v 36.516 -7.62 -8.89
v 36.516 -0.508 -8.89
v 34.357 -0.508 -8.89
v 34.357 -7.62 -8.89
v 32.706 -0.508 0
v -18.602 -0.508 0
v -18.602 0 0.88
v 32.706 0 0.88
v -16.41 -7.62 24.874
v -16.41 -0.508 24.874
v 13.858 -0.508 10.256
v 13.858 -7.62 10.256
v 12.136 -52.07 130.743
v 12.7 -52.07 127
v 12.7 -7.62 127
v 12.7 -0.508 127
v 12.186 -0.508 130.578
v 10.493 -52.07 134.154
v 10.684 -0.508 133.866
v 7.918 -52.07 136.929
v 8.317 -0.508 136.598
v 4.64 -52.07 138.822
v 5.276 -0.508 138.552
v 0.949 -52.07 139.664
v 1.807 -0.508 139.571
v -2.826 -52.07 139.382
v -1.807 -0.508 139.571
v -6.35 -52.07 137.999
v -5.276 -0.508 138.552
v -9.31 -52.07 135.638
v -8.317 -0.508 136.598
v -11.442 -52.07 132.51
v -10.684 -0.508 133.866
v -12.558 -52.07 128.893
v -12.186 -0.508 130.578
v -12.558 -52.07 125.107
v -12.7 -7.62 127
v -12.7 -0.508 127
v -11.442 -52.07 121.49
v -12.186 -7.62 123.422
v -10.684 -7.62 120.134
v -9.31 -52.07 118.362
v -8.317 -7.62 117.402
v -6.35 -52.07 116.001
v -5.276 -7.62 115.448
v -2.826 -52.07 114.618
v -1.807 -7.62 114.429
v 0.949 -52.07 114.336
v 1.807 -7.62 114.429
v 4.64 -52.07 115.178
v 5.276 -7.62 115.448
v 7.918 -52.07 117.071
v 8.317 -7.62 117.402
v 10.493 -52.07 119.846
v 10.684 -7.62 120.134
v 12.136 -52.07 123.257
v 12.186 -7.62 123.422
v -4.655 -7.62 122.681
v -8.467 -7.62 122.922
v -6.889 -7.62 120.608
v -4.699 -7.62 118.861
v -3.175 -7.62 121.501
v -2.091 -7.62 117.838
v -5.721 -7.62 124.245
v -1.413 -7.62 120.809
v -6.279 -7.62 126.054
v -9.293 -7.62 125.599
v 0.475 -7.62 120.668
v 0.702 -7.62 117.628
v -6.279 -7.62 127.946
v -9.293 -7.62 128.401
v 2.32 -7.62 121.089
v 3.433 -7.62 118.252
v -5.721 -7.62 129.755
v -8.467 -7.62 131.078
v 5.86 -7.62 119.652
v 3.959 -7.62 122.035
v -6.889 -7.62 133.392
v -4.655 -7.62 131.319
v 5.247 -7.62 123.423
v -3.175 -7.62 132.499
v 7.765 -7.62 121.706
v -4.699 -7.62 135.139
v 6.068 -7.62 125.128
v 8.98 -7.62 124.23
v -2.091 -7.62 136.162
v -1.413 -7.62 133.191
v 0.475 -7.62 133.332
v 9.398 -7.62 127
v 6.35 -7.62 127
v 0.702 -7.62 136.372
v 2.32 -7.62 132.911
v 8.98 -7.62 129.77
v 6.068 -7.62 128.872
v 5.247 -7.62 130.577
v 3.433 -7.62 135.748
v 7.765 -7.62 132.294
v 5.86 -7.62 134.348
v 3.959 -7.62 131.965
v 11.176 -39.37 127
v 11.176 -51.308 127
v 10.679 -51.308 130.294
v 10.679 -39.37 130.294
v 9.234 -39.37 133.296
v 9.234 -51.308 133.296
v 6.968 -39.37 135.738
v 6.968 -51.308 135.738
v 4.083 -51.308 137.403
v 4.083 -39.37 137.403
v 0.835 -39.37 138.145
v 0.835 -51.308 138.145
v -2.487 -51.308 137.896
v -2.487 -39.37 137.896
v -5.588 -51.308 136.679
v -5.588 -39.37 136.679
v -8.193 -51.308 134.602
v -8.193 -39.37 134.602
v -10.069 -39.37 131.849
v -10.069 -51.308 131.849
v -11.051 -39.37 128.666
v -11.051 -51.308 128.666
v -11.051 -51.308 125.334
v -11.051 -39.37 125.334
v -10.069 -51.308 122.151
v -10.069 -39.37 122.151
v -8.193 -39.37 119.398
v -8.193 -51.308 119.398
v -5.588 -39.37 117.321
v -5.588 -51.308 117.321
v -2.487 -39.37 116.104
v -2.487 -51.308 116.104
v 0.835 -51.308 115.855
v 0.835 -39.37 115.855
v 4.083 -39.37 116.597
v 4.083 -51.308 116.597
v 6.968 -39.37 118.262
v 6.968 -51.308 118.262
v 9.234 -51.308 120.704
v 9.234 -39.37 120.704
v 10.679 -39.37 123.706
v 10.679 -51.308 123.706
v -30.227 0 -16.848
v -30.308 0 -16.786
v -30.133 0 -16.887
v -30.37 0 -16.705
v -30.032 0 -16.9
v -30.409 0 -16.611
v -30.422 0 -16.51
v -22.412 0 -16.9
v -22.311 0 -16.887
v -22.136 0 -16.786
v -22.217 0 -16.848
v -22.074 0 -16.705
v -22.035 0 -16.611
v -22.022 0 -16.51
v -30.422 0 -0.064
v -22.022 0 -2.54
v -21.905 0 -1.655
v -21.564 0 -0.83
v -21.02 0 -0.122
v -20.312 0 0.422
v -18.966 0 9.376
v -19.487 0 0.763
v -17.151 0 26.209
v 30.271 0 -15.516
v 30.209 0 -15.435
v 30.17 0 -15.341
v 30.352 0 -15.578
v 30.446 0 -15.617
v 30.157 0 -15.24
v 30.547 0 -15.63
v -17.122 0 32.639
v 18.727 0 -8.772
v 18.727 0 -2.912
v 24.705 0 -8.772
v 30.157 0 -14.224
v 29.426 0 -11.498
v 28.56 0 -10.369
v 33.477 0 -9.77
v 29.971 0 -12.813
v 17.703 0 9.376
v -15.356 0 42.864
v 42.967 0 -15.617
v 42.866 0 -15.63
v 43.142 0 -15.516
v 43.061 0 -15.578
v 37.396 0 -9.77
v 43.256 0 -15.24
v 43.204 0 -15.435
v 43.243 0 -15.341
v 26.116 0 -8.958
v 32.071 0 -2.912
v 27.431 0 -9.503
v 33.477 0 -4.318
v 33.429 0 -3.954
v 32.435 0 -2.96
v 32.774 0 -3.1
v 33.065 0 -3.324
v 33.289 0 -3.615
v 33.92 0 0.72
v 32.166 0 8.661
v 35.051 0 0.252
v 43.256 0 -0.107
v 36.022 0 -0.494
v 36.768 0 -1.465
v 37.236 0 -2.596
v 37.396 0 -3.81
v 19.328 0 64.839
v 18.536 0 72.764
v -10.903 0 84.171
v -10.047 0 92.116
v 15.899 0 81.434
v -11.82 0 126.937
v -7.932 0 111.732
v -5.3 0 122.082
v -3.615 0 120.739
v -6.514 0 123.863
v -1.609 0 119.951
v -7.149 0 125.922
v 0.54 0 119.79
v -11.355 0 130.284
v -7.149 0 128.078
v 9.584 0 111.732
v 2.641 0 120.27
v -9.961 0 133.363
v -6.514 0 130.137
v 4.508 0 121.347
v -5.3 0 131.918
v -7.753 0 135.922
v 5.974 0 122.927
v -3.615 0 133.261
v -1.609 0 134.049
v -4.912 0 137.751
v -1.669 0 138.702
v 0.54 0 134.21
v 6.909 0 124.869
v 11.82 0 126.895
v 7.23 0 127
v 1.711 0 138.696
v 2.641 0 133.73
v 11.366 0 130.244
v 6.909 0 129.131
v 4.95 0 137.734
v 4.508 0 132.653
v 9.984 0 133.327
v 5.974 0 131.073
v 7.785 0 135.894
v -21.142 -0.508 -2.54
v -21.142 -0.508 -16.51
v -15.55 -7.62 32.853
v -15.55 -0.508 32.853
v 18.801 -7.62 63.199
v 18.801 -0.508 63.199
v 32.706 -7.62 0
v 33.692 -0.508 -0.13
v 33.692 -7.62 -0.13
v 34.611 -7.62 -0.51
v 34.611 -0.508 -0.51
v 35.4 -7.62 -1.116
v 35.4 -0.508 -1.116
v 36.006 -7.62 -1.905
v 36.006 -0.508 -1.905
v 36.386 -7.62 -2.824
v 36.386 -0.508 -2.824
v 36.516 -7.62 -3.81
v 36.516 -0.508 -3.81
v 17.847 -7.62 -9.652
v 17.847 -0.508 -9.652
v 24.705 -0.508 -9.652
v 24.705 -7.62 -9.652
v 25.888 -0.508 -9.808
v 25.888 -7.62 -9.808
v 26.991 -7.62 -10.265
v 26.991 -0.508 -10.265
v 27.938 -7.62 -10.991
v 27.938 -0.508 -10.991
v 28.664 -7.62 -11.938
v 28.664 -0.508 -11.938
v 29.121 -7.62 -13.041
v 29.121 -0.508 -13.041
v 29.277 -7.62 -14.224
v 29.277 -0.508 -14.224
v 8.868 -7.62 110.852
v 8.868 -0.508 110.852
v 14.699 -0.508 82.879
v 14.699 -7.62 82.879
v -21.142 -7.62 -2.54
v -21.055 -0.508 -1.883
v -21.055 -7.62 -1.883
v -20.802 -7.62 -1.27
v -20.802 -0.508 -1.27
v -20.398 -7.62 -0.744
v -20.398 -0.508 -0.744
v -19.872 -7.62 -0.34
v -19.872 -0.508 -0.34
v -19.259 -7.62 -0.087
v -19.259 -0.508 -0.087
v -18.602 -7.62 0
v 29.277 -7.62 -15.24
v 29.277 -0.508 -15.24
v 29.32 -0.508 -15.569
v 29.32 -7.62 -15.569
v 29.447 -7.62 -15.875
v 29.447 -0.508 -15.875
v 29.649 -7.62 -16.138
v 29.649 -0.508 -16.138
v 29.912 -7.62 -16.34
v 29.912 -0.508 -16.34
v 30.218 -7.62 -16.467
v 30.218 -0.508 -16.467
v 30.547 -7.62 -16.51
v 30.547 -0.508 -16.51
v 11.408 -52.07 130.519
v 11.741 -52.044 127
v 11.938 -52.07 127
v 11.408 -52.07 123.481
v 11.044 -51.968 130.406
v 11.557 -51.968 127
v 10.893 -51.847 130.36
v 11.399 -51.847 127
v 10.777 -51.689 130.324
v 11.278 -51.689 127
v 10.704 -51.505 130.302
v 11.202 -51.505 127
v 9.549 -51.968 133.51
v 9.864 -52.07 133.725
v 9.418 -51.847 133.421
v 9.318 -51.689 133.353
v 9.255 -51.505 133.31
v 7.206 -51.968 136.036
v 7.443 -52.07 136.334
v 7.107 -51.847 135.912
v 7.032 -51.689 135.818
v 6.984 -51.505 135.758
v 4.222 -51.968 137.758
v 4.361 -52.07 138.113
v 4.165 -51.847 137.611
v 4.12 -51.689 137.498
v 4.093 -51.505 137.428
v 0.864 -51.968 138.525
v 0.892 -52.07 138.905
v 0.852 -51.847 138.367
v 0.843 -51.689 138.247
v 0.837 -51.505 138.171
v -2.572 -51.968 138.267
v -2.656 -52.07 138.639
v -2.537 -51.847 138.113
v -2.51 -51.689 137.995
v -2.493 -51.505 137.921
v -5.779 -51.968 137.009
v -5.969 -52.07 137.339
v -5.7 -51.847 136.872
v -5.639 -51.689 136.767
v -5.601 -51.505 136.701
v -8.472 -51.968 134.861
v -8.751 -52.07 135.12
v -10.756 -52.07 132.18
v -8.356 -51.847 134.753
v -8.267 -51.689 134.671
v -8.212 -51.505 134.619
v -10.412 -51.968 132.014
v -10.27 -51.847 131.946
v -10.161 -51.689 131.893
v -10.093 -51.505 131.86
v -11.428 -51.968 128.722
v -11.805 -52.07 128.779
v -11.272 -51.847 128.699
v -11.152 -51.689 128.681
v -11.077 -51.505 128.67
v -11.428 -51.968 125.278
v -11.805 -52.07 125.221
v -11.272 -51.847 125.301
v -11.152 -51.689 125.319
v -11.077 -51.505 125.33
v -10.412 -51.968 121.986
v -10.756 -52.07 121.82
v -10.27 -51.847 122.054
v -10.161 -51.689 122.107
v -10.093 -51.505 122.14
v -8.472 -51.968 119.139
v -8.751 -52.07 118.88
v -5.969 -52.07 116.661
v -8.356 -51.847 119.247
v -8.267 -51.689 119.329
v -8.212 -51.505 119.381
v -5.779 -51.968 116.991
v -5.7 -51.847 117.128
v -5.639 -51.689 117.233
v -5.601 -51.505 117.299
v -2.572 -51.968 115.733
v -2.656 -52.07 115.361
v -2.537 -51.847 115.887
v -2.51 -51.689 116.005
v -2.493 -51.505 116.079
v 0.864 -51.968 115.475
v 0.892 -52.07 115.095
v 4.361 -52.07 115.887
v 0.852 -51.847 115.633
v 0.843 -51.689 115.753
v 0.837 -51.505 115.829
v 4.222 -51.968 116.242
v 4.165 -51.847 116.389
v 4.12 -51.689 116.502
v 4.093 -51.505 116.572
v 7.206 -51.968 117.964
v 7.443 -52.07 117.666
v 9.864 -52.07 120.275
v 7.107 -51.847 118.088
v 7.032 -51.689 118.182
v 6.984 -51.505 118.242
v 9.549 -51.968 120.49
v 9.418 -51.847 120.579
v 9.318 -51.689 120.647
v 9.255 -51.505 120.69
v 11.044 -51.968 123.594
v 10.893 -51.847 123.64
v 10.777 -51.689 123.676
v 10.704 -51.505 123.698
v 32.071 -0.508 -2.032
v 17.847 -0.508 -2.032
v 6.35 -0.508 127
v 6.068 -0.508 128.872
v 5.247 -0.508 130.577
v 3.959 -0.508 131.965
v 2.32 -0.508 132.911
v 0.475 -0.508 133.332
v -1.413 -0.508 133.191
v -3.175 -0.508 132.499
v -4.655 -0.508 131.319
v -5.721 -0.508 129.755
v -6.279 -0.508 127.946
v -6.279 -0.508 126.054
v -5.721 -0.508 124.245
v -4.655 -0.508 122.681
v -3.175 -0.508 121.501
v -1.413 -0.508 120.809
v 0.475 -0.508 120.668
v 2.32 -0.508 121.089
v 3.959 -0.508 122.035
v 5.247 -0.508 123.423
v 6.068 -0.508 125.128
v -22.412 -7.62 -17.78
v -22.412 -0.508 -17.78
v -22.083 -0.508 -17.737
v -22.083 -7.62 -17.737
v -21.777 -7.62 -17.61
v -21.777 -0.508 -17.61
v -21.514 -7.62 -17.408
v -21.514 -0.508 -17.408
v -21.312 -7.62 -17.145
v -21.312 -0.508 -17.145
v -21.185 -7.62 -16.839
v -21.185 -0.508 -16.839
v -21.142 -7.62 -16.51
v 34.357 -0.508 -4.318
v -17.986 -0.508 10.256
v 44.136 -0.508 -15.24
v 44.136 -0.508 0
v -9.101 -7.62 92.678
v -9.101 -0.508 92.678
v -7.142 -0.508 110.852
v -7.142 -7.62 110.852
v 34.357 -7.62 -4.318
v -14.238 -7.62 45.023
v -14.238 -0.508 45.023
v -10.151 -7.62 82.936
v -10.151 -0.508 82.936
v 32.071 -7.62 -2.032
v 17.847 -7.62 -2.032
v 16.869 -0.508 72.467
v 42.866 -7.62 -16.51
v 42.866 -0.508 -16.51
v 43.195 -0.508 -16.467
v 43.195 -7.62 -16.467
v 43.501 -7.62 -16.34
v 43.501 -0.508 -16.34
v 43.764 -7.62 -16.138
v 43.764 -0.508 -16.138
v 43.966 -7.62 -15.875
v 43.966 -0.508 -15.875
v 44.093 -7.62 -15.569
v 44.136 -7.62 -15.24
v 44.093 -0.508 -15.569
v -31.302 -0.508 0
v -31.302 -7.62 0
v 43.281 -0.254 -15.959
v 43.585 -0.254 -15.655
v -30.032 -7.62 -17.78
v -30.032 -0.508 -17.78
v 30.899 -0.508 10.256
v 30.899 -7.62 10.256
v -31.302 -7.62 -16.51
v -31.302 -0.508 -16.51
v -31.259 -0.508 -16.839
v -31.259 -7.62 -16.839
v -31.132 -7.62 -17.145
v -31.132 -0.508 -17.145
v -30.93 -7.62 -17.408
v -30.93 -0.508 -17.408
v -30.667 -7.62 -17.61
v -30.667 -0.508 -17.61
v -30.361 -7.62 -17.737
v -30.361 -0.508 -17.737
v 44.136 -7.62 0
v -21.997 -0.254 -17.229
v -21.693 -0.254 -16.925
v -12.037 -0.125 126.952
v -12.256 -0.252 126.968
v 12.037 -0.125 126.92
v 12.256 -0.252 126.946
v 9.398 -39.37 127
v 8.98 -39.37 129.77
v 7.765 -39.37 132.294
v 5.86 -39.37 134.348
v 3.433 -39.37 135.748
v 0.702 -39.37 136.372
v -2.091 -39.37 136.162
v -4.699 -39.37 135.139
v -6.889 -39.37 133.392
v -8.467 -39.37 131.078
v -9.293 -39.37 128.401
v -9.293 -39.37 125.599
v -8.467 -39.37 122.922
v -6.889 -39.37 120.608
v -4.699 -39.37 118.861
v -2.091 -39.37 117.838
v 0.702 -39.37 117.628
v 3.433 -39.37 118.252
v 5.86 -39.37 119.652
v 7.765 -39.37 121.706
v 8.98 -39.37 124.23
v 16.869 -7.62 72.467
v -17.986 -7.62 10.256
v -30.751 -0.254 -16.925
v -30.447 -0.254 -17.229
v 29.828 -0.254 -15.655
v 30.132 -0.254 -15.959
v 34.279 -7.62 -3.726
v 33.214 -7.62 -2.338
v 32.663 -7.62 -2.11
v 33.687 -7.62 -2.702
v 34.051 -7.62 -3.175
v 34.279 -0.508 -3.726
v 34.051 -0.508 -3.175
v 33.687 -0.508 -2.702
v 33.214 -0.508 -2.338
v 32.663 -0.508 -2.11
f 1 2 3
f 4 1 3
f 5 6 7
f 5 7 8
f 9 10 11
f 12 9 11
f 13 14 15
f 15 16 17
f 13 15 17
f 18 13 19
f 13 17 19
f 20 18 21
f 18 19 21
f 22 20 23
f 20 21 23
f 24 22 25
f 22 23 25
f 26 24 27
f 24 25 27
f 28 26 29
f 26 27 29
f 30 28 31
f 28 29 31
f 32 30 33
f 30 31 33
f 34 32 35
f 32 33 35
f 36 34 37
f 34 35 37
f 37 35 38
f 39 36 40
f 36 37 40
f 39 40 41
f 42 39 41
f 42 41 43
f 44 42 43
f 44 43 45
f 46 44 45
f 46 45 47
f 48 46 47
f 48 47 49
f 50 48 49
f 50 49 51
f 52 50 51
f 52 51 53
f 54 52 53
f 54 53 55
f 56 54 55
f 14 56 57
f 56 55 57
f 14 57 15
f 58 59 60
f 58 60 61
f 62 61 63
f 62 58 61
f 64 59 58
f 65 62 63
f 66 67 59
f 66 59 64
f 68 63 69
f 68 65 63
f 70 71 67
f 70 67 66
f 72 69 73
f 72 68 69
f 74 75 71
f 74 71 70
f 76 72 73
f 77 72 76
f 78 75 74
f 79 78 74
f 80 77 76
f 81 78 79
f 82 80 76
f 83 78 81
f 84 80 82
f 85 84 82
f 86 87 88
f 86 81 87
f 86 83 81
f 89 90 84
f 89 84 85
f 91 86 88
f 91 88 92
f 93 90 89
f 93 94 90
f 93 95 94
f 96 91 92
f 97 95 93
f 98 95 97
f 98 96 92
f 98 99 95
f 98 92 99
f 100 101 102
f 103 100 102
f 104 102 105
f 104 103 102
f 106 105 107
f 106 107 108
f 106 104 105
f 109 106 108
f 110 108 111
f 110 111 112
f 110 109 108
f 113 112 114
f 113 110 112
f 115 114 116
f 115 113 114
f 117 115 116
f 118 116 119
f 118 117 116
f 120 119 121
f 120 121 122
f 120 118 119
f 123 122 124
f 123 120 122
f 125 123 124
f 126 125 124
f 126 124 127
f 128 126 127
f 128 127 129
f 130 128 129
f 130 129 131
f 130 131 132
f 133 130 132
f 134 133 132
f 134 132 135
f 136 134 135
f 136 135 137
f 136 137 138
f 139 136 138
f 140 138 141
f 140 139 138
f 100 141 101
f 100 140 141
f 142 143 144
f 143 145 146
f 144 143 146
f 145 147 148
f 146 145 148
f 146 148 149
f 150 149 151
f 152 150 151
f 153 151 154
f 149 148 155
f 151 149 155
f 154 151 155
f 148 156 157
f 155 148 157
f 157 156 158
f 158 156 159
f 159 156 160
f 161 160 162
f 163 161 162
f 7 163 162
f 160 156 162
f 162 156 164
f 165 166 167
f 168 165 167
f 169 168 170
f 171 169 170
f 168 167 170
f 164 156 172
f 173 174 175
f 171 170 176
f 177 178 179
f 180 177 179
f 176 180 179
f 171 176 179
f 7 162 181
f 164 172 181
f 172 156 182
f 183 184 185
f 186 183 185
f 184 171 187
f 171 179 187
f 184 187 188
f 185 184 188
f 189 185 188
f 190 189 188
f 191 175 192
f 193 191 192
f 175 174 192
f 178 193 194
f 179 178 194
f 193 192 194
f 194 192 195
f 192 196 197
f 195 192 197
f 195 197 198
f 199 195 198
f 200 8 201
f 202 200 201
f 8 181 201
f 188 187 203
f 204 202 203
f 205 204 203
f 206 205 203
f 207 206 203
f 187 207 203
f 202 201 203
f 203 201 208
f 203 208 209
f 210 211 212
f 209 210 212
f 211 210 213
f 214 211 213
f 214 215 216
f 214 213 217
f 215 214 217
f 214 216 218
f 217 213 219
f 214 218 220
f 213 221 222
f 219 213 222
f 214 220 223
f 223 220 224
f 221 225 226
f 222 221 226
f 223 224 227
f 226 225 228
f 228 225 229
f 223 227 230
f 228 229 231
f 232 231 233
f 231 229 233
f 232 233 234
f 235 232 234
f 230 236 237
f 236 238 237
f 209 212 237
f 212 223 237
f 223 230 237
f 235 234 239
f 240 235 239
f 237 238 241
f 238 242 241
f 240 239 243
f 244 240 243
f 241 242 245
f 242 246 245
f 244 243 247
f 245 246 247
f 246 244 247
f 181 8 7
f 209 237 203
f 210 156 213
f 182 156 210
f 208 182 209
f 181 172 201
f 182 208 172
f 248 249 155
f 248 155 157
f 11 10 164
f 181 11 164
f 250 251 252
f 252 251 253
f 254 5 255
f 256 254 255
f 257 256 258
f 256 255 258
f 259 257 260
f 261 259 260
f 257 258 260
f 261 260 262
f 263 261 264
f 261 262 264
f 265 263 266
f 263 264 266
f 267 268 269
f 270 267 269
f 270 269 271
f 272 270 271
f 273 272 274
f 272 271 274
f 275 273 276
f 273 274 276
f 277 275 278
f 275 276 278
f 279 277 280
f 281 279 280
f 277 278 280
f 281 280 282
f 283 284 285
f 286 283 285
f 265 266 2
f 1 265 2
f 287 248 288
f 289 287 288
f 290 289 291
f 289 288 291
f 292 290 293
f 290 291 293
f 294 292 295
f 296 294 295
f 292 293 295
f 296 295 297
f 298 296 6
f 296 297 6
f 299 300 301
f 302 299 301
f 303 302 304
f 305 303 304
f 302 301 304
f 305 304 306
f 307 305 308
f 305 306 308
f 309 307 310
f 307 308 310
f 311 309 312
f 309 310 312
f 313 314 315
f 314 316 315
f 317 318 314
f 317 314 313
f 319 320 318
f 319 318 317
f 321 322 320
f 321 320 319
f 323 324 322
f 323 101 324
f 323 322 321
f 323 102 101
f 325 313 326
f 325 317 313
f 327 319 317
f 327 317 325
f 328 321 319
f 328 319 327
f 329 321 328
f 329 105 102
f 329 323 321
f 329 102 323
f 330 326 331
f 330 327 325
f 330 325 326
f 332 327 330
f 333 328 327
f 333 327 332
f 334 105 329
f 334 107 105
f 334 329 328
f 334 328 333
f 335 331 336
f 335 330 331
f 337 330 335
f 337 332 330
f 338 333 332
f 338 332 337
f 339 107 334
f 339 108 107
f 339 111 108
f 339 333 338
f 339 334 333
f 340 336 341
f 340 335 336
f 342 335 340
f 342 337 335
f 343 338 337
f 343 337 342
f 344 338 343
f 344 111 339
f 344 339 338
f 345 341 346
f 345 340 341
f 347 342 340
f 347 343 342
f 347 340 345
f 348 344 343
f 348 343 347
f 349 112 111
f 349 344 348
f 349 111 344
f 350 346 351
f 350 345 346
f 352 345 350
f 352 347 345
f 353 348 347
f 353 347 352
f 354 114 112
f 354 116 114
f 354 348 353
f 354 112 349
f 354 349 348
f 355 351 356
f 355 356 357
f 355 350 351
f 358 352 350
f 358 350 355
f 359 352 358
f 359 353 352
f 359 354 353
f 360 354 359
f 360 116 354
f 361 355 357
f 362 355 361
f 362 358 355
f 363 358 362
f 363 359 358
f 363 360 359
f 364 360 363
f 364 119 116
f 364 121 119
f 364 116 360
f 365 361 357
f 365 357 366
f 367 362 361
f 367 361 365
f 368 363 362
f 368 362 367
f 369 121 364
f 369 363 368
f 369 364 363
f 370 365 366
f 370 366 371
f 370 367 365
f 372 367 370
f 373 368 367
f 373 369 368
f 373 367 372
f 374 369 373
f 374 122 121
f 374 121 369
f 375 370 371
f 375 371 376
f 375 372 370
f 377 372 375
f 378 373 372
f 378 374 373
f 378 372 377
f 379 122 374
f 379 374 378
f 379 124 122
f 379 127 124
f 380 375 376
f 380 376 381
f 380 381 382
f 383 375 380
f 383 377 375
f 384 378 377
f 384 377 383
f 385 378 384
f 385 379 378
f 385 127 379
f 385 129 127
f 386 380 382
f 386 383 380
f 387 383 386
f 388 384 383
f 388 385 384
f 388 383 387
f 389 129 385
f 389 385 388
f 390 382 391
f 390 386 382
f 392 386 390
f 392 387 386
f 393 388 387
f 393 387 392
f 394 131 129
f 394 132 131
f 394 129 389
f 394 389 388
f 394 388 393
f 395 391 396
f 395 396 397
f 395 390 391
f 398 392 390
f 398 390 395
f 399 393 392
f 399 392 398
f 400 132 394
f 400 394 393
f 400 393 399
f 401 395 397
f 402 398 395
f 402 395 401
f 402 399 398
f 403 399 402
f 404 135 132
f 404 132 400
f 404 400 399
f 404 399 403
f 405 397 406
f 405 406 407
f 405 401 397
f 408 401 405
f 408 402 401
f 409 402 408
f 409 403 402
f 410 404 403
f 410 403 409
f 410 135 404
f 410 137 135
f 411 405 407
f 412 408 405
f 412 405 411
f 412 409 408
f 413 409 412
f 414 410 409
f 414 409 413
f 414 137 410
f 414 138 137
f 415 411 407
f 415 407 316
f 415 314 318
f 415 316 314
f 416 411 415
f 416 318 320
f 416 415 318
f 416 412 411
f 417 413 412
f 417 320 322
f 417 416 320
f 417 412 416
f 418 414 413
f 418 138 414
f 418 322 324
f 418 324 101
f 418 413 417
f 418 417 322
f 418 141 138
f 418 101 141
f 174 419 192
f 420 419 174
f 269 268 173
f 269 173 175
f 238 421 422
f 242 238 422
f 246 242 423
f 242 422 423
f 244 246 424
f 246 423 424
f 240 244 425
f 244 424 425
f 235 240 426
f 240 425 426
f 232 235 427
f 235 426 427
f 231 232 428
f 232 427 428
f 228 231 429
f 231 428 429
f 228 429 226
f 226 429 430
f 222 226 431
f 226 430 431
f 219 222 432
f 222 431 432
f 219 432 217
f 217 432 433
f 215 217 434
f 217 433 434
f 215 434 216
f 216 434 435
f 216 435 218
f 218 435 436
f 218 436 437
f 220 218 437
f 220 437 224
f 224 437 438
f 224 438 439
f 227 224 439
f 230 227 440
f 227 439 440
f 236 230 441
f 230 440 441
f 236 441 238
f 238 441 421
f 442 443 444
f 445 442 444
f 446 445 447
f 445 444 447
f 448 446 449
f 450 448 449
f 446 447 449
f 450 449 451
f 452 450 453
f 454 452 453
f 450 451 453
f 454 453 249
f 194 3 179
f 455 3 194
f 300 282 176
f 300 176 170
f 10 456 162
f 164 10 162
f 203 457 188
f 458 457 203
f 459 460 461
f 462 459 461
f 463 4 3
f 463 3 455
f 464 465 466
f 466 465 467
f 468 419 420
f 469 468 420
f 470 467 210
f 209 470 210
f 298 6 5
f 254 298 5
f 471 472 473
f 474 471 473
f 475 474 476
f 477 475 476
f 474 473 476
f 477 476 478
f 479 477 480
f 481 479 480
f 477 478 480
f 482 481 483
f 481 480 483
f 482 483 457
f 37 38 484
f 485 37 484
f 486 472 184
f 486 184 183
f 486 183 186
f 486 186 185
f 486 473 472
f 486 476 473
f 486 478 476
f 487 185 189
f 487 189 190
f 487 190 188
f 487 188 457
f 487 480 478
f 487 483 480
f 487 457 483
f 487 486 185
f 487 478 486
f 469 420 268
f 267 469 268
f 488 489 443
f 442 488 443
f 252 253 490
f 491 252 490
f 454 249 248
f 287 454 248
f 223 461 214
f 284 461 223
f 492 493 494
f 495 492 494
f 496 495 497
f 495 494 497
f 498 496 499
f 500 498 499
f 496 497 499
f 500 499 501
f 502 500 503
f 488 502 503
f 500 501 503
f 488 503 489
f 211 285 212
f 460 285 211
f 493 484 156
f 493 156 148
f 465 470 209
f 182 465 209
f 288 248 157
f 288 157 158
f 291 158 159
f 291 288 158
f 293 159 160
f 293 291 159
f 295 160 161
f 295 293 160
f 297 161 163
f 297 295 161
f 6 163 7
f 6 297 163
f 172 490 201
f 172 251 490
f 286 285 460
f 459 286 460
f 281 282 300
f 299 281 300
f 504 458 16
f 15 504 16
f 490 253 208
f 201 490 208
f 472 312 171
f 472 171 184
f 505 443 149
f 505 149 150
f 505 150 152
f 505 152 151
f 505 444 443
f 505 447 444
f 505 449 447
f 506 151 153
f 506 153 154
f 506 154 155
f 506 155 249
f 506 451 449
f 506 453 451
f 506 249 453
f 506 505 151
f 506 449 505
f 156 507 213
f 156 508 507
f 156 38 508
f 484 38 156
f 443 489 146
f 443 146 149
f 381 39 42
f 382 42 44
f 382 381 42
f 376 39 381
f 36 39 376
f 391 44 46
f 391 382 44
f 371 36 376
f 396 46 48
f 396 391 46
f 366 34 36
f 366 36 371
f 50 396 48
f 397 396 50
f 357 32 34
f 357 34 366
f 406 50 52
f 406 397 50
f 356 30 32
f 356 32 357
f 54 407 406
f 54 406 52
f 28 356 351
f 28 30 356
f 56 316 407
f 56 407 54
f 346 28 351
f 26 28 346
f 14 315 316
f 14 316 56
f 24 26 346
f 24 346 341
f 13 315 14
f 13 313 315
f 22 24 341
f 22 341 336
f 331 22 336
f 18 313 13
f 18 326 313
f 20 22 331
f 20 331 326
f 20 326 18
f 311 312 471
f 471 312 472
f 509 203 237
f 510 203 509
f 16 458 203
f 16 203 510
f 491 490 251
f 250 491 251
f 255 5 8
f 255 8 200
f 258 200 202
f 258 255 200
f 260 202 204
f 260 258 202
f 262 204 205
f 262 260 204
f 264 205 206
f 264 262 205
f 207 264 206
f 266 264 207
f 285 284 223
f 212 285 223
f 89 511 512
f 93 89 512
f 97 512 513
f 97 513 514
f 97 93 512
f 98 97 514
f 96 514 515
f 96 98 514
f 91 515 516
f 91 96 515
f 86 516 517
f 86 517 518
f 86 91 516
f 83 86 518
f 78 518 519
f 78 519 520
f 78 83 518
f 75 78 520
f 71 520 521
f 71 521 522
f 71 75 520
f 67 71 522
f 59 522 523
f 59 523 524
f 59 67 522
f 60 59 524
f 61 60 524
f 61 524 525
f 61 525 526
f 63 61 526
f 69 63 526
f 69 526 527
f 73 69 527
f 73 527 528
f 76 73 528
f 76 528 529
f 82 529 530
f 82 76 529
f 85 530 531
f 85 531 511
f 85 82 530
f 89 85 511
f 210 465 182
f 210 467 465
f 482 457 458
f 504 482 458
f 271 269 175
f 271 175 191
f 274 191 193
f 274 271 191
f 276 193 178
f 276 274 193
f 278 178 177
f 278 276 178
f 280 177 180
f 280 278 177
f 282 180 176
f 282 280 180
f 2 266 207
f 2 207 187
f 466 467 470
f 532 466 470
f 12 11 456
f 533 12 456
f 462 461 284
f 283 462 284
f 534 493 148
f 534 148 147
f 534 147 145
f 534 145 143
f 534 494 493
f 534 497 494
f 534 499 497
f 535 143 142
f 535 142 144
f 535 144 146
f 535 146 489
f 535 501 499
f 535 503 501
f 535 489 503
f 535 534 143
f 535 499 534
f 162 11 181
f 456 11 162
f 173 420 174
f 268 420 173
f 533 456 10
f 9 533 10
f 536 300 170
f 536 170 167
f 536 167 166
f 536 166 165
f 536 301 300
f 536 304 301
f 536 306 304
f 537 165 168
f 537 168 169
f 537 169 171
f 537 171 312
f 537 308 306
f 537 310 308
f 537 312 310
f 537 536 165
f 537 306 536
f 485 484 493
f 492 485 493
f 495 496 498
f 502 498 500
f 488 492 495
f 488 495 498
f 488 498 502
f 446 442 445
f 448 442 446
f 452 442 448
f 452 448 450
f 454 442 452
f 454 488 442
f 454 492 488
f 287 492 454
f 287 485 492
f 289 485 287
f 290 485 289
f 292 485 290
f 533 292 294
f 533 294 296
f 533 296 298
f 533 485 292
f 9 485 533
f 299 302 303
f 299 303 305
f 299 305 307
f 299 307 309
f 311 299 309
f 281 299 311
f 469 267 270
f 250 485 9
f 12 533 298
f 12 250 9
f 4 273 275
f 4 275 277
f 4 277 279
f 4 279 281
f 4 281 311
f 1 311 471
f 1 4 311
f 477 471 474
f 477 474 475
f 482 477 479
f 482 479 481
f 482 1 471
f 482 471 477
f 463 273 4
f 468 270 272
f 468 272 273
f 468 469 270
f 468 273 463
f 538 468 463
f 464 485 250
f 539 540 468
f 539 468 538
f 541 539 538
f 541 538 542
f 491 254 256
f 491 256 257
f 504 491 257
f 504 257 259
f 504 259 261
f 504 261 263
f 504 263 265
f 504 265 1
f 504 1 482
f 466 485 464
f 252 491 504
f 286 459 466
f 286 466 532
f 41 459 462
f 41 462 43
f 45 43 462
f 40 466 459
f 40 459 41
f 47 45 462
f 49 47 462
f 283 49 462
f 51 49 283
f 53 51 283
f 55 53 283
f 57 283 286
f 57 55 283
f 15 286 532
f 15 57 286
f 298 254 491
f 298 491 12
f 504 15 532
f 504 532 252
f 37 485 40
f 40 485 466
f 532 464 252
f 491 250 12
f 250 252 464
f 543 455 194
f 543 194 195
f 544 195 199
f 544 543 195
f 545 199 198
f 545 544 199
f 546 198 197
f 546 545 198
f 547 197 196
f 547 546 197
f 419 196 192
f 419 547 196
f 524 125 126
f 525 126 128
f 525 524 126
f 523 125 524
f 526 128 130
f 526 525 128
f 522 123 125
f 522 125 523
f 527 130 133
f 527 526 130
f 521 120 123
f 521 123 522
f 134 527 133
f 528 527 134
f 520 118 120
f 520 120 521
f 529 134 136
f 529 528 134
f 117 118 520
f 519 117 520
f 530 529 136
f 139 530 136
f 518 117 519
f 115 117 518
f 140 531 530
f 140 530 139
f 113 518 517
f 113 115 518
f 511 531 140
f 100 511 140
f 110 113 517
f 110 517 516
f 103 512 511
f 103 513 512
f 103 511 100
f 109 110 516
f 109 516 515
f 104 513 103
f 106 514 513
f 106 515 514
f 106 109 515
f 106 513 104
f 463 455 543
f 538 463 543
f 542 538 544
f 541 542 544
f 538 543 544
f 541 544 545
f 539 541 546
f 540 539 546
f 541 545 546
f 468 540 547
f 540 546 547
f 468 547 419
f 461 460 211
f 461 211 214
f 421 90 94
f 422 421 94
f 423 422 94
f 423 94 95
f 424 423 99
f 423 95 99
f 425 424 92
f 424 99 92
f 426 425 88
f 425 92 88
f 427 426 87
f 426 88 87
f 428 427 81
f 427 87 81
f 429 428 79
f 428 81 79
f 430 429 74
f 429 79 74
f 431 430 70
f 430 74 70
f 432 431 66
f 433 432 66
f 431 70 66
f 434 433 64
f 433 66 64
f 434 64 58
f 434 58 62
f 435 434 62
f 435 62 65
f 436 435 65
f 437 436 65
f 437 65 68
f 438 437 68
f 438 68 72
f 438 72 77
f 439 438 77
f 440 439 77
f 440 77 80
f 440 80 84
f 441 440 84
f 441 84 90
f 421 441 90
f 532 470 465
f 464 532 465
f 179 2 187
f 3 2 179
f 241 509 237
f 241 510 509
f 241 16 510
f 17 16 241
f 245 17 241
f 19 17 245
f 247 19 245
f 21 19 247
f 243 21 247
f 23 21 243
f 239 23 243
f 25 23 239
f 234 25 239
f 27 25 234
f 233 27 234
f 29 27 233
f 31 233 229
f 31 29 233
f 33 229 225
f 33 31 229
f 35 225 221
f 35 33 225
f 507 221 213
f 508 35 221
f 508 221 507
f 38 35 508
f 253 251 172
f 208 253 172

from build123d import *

# Parameters (mm, degrees)
F1_DEPTH = 7.62
F2_R     = 12.7
F2_R_2   = 9.398
F3_DEPTH = 31.75
F4_R     = 12.7
F4_R_2   = 11.176
F5_DEPTH = 12.7
F6_R     = 6.35
F7_DEPTH = 25.4
F8_R     = 0.762
F9_SIZE2 = 0.508
F9_SIZE  = 0.8798818102


with BuildPart() as f1:
    # F0 (on Front) → F1 (new body)
    with BuildSketch(Plane.XZ):
        with BuildLine():
            ThreePointArc((-21.1420084076, -2.54), (-20.3980596318, -0.7439487758), (-18.6020084076, 0))
            Line((-18.6020084076, 0), (32.7059915924, 0))
            ThreePointArc((32.7059915924, 0), (35.4000684287, -1.1159231637), (36.5159915924, -3.81))
            Line((36.5159915924, -3.81), (36.5159915924, -8.89))
            Line((36.5159915924, -8.89), (34.3569915924, -8.89))
            Line((34.3569915924, -8.89), (34.3569915924, -4.318))
            ThreePointArc((34.3569915924, -4.318), (33.6874376942, -2.7015538982), (32.0709915924, -2.032))
            Line((32.0709915924, -2.032), (29.2769915924, -2.032))
            Line((29.2769915924, -2.032), (17.8469915924, -2.032))
            Line((17.8469915924, -2.032), (17.8469915924, -9.652))
            Line((17.8469915924, -9.652), (24.7049915924, -9.652))
            ThreePointArc((24.7049915924, -9.652), (27.937883796, -10.9911077964), (29.2769915924, -14.224))
            Line((29.2769915924, -14.224), (29.2769915924, -15.24))
            ThreePointArc((29.2769915924, -15.24), (29.6489659803, -16.1380256121), (30.5469915924, -16.51))
            Line((30.5469915924, -16.51), (42.8659915924, -16.51))
            ThreePointArc((42.8659915924, -16.51), (43.7640172045, -16.1380256121), (44.1359915924, -15.24))
            Line((44.1359915924, -15.24), (44.1359915924, 0))
            Line((44.1359915924, 0), (12.7, 127))
            ThreePointArc((12.7, 127), (0, 139.7), (-12.7, 127))
            Line((-12.7, 127), (-31.3020084076, 0))
            Line((-31.3020084076, 0), (-31.3020084076, -16.51))
            ThreePointArc((-31.3020084076, -16.51), (-30.9300340197, -17.4080256121), (-30.0320084076, -17.78))
            Line((-30.0320084076, -17.78), (-22.4120084076, -17.78))
            ThreePointArc((-22.4120084076, -17.78), (-21.5139827955, -17.4080256121), (-21.1420084076, -16.51))
            Line((-21.1420084076, -16.51), (-21.1420084076, -2.54))
        make_face()
        Polygon((13.8583155349, 10.2559253573), (-17.4904800951, 10.2559253573), (-17.9861974368, 10.2559253573), (-16.4103638381, 24.8740110546), align=None, mode=Mode.SUBTRACT)
        Polygon((30.8991490559, 10.2559253573), (-15.5502194539, 32.8530669212), (18.8005114427, 63.1991239488), align=None, mode=Mode.SUBTRACT)
        Polygon((16.8689347681, 72.4665825348), (-14.2382610105, 45.0233372929), (-10.1512422372, 82.9362176403), align=None, mode=Mode.SUBTRACT)
        Polygon((-7.1419274588, 110.8518689871), (8.8684540242, 110.8518689871), (14.6986516415, 82.8793242388), (-9.1010310551, 92.6784119132), align=None, mode=Mode.SUBTRACT)
    extrude(amount=F1_DEPTH)

    # F2 (on face) → F3 (join)
    with BuildSketch(Plane.XZ.offset(7.62)):
        with Locations((0, 127)):
            Circle(F2_R)
        with Locations((0, 127)):
            Circle(F2_R_2, mode=Mode.SUBTRACT)
    extrude(amount=F3_DEPTH)

    # F4 (on face) → F5 (join)
    with BuildSketch(Plane.XZ.offset(39.37)):
        with Locations((0, 127)):
            Circle(F4_R)
        with Locations((0, 127)):
            Circle(F4_R_2, mode=Mode.SUBTRACT)
    extrude(amount=F5_DEPTH)

    # F6 (on face) → F7 (cut)
    with BuildSketch(Plane.XZ.offset(7.62)):
        with Locations((0, 127)):
            Circle(F6_R)
    extrude(amount=-F7_DEPTH, mode=Mode.SUBTRACT)

    # F8
    f8_edges = [f1.edges().sort_by_distance(p)[0] for p in [
        (-11.176, -52.07, 127),
    ]]
    fillet(f8_edges, radius=F8_R)

    # F9
    f9_edges = [f1.edges().sort_by_distance(p)[0] for p in [
        (-31.302008, 0, -8.255),
        (-22.001004, 0, 63.5),
        (-30.930034, 0, -17.408026),
        (0, 0, 139.7),
        (-26.222008, 0, -17.78),
        (28.417996, 0, 63.5),
        (-21.513983, 0, -17.408026),
        (44.135992, 0, -7.62),
        (-21.142008, 0, -9.525),
        (43.764017, 0, -16.138026),
        (-20.39806, 0, -0.743949),
        (36.706492, 0, -16.51),
        (7.051992, 0, 0),
        (29.648966, 0, -16.138026),
        (35.400068, 0, -1.115923),
        (29.276992, 0, -14.732),
        (36.515992, 0, -6.35),
        (27.937884, 0, -10.991108),
        (35.436492, 0, -8.89),
        (21.275992, 0, -9.652),
        (34.356992, 0, -6.604),
        (17.846992, 0, -5.842),
        (33.687438, 0, -2.701554),
        (24.958992, 0, -2.032),
        (-17.198281, 0, 17.564968),
        (-2.063941, 0, 10.255925),
        (-1.276024, 0, 17.564968),
        (1.315337, 0, 58.74496),
        (3.358846, 0, 77.7014),
        (-12.194752, 0, 63.979777),
        (24.84983, 0, 36.727525),
        (1.625146, 0, 48.026095),
        (7.674465, 0, 21.554496),
        (0.863263, 0, 110.851869),
        (-8.121479, 0, 101.76514),
        (11.783553, 0, 96.865597),
        (2.79881, 0, 87.778868),
        (-6.35, 0, 127),
    ]]
    f9_side = f1.faces().sort_by_distance((-29.555846, 0, -8.255))[0]
    chamfer(f9_edges, length=F9_SIZE, length2=F9_SIZE2, reference=f9_side)


solid = f1.part
